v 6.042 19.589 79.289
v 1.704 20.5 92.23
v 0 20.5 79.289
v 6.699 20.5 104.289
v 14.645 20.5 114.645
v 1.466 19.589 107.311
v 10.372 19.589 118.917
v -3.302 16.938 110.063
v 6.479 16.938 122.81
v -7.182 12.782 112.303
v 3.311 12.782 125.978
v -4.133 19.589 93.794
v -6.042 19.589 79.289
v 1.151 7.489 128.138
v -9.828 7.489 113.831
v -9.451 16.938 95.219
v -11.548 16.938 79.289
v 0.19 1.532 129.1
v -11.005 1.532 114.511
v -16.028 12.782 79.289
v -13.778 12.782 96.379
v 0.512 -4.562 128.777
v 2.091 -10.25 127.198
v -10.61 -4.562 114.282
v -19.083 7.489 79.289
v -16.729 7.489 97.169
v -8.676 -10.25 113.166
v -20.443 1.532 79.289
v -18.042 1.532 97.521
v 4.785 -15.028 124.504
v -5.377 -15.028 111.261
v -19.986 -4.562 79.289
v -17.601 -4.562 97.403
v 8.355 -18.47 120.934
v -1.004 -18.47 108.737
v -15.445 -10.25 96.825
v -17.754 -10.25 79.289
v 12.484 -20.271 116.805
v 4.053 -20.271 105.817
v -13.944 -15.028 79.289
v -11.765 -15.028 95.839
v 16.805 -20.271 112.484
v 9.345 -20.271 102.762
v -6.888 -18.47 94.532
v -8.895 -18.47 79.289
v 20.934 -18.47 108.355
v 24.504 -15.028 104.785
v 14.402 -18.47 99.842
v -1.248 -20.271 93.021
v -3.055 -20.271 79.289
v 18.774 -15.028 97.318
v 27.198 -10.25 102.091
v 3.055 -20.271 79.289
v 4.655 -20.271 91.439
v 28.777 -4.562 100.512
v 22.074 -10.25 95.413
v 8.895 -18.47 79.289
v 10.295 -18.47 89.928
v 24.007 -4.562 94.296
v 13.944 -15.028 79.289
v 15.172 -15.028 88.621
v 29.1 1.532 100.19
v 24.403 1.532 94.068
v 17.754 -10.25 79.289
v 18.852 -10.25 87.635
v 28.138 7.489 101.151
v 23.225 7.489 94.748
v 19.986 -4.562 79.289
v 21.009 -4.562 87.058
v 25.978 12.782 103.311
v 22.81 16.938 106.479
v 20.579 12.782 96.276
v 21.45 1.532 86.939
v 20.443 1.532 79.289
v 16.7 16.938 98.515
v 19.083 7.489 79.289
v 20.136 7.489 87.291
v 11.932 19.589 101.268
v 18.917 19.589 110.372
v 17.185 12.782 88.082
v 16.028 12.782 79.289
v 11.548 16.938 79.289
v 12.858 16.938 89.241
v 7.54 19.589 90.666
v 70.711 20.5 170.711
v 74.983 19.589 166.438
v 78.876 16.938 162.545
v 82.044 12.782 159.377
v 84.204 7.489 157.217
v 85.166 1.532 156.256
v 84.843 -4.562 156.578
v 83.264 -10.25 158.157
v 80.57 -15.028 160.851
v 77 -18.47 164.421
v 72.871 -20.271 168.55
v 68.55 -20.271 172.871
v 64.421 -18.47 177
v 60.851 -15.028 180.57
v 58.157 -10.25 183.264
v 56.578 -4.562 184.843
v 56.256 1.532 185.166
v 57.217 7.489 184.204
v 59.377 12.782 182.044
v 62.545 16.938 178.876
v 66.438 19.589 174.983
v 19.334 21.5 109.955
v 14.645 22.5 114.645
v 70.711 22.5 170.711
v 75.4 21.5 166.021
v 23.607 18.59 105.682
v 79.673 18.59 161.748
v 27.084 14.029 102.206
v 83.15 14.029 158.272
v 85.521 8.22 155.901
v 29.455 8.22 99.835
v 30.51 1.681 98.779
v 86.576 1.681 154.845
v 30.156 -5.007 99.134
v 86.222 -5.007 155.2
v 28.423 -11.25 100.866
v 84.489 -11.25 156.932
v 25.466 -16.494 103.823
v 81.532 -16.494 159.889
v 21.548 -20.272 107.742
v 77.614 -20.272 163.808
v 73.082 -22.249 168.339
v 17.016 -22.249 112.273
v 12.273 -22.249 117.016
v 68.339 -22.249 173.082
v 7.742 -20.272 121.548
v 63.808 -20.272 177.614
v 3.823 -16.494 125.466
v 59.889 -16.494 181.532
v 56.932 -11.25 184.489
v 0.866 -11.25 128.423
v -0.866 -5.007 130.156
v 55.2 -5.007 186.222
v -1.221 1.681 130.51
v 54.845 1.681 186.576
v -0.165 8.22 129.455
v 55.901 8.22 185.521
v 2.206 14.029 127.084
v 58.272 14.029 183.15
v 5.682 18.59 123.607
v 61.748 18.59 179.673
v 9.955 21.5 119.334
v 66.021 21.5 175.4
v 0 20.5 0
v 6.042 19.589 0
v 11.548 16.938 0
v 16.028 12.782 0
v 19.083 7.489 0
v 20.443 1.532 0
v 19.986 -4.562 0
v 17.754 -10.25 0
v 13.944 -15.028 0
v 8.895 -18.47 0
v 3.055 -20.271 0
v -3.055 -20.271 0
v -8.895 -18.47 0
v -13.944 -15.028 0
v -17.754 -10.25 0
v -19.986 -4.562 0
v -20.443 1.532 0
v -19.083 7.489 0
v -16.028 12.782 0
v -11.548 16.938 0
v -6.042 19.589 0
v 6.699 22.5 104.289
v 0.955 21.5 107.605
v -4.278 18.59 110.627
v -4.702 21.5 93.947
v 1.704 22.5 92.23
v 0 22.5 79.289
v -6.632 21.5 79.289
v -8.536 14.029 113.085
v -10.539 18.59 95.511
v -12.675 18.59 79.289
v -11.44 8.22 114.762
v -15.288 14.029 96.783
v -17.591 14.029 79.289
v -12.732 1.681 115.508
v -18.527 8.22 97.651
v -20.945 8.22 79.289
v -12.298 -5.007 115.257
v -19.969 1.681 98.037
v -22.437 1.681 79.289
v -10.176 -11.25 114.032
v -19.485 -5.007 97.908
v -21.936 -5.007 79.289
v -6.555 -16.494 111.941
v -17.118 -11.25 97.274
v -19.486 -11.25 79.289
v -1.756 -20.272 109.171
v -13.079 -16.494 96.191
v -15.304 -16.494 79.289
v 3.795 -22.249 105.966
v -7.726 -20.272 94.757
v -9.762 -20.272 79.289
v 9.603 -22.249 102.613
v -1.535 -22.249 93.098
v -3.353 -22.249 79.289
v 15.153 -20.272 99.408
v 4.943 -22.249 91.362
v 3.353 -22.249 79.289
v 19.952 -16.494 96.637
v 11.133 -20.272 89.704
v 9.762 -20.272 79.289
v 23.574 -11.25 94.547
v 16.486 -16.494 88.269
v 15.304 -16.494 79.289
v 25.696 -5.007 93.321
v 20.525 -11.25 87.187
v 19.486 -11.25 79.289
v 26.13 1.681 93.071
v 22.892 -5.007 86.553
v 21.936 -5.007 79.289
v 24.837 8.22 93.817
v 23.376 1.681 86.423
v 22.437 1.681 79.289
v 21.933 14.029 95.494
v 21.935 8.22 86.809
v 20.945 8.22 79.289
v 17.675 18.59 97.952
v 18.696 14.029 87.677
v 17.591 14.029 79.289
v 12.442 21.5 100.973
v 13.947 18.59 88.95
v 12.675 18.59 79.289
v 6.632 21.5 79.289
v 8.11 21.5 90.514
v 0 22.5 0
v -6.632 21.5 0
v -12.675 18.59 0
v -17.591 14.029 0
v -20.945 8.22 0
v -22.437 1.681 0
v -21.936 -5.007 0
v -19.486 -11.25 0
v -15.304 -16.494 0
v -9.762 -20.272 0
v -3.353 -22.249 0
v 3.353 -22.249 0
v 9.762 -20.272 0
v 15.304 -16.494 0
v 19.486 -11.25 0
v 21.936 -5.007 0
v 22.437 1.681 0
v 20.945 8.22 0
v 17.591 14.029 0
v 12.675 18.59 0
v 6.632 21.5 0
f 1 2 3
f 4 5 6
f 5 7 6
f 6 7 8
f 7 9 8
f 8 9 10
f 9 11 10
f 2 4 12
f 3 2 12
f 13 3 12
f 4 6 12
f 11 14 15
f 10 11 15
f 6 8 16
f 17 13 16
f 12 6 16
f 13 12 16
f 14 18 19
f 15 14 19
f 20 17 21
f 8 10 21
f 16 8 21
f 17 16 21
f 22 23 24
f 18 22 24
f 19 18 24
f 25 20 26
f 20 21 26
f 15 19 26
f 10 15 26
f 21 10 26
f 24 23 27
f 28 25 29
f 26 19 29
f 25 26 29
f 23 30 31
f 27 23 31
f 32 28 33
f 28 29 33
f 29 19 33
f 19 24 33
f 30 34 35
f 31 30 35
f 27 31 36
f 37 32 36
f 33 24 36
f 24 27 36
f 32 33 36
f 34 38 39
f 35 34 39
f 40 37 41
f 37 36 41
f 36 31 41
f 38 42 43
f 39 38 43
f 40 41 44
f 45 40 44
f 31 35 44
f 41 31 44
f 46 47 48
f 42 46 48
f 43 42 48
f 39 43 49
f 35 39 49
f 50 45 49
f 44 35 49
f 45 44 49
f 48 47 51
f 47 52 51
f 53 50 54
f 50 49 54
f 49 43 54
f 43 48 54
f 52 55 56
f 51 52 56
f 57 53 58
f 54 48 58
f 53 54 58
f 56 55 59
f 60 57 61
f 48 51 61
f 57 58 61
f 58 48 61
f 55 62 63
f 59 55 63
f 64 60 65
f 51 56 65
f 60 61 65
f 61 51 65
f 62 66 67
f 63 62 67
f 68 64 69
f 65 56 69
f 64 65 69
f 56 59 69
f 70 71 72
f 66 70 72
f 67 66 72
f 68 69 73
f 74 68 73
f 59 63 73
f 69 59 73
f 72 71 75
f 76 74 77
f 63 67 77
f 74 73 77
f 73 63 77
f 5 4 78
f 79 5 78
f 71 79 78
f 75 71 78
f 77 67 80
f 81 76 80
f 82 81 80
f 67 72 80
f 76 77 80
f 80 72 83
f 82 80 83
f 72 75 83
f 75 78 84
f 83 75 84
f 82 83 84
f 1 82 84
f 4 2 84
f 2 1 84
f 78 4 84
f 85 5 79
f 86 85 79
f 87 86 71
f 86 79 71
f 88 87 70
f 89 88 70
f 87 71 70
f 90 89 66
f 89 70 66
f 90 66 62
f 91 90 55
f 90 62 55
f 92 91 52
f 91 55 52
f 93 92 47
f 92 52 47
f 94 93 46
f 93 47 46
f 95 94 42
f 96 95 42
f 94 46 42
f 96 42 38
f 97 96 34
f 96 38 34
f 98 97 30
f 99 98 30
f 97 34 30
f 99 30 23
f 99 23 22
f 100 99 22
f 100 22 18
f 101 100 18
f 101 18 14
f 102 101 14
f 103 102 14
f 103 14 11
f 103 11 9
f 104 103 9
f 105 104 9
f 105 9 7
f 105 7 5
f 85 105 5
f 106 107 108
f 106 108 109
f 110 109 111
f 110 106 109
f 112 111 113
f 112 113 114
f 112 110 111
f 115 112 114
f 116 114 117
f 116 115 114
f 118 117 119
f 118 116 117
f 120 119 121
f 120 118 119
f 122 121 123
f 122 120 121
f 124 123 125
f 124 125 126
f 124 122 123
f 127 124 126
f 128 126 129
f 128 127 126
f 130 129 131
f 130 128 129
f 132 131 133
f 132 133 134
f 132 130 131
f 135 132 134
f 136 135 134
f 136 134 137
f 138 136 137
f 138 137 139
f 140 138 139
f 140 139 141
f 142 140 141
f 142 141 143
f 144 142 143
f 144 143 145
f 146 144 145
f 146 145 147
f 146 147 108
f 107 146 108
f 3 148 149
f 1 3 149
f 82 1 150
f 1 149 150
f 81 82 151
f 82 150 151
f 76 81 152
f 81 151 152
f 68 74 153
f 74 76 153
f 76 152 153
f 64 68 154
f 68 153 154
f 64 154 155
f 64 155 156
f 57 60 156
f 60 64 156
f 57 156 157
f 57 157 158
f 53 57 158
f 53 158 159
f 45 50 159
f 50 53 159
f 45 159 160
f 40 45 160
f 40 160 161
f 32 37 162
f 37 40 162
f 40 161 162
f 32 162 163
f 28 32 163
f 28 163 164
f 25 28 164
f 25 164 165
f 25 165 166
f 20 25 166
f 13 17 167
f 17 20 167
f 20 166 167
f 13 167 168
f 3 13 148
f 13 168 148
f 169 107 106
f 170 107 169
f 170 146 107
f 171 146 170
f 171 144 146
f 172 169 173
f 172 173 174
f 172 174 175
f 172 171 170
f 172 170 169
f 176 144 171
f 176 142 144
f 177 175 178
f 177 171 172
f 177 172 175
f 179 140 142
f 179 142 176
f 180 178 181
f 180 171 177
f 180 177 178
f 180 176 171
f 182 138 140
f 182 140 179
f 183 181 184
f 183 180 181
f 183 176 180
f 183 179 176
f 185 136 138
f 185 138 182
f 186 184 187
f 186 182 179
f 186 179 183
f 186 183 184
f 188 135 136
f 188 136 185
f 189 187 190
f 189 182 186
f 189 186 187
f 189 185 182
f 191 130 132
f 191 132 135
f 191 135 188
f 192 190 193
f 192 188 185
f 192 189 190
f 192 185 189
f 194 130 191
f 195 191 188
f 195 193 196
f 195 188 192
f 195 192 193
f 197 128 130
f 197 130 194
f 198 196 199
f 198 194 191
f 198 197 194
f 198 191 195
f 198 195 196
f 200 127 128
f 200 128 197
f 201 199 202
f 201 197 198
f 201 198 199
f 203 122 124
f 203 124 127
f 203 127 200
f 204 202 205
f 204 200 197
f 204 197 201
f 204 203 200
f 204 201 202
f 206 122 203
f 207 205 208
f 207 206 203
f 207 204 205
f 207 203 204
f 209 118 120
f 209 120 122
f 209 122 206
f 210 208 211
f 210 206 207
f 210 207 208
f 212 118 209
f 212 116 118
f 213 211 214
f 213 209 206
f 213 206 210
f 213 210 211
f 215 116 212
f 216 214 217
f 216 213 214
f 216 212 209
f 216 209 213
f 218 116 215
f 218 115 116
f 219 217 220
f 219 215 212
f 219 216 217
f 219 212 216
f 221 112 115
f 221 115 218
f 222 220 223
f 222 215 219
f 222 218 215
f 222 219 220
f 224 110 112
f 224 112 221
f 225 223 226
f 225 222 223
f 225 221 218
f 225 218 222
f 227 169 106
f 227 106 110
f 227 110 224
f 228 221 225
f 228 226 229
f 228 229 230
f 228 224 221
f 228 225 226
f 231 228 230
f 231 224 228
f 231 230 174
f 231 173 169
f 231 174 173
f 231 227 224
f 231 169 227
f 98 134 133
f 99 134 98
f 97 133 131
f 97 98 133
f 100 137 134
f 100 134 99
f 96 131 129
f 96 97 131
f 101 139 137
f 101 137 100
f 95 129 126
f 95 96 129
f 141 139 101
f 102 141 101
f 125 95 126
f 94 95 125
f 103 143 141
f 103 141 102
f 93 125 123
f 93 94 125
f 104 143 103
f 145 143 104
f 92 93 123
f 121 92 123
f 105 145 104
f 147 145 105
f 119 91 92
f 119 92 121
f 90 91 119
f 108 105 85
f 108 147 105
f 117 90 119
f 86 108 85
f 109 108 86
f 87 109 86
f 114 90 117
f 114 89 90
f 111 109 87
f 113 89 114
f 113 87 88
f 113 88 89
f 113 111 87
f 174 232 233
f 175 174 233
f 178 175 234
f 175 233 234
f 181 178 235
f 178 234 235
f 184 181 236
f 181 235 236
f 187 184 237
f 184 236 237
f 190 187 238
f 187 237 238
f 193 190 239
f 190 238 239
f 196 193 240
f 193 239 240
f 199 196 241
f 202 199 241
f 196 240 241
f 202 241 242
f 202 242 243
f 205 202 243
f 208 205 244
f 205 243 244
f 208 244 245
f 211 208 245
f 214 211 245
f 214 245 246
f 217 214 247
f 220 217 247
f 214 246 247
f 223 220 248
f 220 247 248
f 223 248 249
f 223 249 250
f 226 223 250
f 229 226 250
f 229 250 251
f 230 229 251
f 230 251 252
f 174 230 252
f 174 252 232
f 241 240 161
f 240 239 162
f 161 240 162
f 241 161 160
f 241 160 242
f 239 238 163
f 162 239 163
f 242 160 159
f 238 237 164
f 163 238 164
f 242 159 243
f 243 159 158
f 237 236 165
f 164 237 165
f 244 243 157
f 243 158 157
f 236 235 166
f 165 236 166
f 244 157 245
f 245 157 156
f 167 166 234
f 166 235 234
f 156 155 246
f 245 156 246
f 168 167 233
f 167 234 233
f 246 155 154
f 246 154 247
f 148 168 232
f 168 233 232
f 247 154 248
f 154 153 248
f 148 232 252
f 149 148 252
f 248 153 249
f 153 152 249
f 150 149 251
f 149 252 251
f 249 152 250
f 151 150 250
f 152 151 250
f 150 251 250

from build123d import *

# Parameters (mm, degrees)
F4_R   = 22.5
F4_R_2 = 20.5


with BuildPart() as f5:
    # F5: sweep along a path in F0
    with BuildLine(Plane.XZ) as f5_path:
        Line((70.710678, 170.710678), (14.644661, 114.644661))
        ThreePointArc((14.644661, 114.644661), (3.806023, 98.423493), (0, 79.289322))
        Line((0, 79.289322), (0, 0))
    # F4 (on face) → F5 (sweep)
    with BuildSketch(Plane(origin=(120.710678, 0, 120.710678), x_dir=(0, 1, 0), z_dir=(0.707107, 0, 0.707107))):
        with Locations((0, 70.710678)):
            Circle(F4_R)
        with Locations((0, 70.710678)):
            Circle(F4_R_2, mode=Mode.SUBTRACT)
    sweep(path=f5_path.line)


solid = f5.part
